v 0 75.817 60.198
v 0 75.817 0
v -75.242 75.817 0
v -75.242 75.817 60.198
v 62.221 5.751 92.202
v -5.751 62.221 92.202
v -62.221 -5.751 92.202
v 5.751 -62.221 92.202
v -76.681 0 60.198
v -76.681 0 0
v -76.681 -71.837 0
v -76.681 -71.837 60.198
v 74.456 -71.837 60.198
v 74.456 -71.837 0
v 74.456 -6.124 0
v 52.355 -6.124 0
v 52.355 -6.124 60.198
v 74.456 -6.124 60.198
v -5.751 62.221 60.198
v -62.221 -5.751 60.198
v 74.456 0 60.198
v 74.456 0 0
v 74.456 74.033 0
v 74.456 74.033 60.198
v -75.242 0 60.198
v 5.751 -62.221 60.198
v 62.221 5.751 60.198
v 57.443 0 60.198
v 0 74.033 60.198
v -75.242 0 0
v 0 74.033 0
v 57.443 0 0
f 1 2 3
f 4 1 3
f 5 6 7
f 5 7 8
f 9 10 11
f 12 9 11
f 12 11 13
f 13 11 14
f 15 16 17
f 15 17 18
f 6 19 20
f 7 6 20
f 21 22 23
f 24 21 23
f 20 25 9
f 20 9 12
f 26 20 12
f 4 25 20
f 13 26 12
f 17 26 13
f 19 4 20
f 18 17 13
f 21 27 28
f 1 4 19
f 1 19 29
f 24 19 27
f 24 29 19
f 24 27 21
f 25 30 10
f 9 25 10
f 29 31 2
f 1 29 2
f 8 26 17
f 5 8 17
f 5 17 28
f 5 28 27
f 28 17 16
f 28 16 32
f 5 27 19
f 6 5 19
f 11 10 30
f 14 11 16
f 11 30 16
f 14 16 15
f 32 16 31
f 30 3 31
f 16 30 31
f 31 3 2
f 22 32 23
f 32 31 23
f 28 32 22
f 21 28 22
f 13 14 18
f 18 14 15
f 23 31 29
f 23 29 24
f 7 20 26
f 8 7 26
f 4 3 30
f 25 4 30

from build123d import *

# Parameters (mm, degrees)
F0_W     = 74.456050992
F0_H     = 65.7130181789
F0_H_2   = 74.0327015519
F1_DEPTH = 60.198
F3_DEPTH = 92.202


with BuildPart() as f1:
    # F0 (on Top) → F1 (new body)
    with BuildSketch(Plane.XY):
        with Locations((37.228025496, -38.9802902937)):
            Rectangle(F0_W, F0_H)
        with Locations((37.228025496, 37.016350776)):
            Rectangle(F0_W, F0_H_2)
        Polygon((-75.2415657043, 0), (0, 0), (0, 74.0327015519), (0, 75.8170485497), (-75.2415657043, 75.8170485497), align=None)
        Polygon((0, -6.1237812042), (0, 0), (-75.2415657043, 0), (-76.6809433699, 0), (-76.6809433699, -71.8367993832), (0, -71.8367993832), align=None)
    extrude(amount=F1_DEPTH)

    # F2 (on Top) → F3 (join)
    with BuildSketch(Plane.XY):
        Polygon((-5.7511497289, 62.2206833214), (-62.2206833214, -5.7511497289), (5.7511497289, -62.2206833214), (62.2206833214, 5.7511497289), align=None)
    extrude(amount=F3_DEPTH)


solid = f1.part
